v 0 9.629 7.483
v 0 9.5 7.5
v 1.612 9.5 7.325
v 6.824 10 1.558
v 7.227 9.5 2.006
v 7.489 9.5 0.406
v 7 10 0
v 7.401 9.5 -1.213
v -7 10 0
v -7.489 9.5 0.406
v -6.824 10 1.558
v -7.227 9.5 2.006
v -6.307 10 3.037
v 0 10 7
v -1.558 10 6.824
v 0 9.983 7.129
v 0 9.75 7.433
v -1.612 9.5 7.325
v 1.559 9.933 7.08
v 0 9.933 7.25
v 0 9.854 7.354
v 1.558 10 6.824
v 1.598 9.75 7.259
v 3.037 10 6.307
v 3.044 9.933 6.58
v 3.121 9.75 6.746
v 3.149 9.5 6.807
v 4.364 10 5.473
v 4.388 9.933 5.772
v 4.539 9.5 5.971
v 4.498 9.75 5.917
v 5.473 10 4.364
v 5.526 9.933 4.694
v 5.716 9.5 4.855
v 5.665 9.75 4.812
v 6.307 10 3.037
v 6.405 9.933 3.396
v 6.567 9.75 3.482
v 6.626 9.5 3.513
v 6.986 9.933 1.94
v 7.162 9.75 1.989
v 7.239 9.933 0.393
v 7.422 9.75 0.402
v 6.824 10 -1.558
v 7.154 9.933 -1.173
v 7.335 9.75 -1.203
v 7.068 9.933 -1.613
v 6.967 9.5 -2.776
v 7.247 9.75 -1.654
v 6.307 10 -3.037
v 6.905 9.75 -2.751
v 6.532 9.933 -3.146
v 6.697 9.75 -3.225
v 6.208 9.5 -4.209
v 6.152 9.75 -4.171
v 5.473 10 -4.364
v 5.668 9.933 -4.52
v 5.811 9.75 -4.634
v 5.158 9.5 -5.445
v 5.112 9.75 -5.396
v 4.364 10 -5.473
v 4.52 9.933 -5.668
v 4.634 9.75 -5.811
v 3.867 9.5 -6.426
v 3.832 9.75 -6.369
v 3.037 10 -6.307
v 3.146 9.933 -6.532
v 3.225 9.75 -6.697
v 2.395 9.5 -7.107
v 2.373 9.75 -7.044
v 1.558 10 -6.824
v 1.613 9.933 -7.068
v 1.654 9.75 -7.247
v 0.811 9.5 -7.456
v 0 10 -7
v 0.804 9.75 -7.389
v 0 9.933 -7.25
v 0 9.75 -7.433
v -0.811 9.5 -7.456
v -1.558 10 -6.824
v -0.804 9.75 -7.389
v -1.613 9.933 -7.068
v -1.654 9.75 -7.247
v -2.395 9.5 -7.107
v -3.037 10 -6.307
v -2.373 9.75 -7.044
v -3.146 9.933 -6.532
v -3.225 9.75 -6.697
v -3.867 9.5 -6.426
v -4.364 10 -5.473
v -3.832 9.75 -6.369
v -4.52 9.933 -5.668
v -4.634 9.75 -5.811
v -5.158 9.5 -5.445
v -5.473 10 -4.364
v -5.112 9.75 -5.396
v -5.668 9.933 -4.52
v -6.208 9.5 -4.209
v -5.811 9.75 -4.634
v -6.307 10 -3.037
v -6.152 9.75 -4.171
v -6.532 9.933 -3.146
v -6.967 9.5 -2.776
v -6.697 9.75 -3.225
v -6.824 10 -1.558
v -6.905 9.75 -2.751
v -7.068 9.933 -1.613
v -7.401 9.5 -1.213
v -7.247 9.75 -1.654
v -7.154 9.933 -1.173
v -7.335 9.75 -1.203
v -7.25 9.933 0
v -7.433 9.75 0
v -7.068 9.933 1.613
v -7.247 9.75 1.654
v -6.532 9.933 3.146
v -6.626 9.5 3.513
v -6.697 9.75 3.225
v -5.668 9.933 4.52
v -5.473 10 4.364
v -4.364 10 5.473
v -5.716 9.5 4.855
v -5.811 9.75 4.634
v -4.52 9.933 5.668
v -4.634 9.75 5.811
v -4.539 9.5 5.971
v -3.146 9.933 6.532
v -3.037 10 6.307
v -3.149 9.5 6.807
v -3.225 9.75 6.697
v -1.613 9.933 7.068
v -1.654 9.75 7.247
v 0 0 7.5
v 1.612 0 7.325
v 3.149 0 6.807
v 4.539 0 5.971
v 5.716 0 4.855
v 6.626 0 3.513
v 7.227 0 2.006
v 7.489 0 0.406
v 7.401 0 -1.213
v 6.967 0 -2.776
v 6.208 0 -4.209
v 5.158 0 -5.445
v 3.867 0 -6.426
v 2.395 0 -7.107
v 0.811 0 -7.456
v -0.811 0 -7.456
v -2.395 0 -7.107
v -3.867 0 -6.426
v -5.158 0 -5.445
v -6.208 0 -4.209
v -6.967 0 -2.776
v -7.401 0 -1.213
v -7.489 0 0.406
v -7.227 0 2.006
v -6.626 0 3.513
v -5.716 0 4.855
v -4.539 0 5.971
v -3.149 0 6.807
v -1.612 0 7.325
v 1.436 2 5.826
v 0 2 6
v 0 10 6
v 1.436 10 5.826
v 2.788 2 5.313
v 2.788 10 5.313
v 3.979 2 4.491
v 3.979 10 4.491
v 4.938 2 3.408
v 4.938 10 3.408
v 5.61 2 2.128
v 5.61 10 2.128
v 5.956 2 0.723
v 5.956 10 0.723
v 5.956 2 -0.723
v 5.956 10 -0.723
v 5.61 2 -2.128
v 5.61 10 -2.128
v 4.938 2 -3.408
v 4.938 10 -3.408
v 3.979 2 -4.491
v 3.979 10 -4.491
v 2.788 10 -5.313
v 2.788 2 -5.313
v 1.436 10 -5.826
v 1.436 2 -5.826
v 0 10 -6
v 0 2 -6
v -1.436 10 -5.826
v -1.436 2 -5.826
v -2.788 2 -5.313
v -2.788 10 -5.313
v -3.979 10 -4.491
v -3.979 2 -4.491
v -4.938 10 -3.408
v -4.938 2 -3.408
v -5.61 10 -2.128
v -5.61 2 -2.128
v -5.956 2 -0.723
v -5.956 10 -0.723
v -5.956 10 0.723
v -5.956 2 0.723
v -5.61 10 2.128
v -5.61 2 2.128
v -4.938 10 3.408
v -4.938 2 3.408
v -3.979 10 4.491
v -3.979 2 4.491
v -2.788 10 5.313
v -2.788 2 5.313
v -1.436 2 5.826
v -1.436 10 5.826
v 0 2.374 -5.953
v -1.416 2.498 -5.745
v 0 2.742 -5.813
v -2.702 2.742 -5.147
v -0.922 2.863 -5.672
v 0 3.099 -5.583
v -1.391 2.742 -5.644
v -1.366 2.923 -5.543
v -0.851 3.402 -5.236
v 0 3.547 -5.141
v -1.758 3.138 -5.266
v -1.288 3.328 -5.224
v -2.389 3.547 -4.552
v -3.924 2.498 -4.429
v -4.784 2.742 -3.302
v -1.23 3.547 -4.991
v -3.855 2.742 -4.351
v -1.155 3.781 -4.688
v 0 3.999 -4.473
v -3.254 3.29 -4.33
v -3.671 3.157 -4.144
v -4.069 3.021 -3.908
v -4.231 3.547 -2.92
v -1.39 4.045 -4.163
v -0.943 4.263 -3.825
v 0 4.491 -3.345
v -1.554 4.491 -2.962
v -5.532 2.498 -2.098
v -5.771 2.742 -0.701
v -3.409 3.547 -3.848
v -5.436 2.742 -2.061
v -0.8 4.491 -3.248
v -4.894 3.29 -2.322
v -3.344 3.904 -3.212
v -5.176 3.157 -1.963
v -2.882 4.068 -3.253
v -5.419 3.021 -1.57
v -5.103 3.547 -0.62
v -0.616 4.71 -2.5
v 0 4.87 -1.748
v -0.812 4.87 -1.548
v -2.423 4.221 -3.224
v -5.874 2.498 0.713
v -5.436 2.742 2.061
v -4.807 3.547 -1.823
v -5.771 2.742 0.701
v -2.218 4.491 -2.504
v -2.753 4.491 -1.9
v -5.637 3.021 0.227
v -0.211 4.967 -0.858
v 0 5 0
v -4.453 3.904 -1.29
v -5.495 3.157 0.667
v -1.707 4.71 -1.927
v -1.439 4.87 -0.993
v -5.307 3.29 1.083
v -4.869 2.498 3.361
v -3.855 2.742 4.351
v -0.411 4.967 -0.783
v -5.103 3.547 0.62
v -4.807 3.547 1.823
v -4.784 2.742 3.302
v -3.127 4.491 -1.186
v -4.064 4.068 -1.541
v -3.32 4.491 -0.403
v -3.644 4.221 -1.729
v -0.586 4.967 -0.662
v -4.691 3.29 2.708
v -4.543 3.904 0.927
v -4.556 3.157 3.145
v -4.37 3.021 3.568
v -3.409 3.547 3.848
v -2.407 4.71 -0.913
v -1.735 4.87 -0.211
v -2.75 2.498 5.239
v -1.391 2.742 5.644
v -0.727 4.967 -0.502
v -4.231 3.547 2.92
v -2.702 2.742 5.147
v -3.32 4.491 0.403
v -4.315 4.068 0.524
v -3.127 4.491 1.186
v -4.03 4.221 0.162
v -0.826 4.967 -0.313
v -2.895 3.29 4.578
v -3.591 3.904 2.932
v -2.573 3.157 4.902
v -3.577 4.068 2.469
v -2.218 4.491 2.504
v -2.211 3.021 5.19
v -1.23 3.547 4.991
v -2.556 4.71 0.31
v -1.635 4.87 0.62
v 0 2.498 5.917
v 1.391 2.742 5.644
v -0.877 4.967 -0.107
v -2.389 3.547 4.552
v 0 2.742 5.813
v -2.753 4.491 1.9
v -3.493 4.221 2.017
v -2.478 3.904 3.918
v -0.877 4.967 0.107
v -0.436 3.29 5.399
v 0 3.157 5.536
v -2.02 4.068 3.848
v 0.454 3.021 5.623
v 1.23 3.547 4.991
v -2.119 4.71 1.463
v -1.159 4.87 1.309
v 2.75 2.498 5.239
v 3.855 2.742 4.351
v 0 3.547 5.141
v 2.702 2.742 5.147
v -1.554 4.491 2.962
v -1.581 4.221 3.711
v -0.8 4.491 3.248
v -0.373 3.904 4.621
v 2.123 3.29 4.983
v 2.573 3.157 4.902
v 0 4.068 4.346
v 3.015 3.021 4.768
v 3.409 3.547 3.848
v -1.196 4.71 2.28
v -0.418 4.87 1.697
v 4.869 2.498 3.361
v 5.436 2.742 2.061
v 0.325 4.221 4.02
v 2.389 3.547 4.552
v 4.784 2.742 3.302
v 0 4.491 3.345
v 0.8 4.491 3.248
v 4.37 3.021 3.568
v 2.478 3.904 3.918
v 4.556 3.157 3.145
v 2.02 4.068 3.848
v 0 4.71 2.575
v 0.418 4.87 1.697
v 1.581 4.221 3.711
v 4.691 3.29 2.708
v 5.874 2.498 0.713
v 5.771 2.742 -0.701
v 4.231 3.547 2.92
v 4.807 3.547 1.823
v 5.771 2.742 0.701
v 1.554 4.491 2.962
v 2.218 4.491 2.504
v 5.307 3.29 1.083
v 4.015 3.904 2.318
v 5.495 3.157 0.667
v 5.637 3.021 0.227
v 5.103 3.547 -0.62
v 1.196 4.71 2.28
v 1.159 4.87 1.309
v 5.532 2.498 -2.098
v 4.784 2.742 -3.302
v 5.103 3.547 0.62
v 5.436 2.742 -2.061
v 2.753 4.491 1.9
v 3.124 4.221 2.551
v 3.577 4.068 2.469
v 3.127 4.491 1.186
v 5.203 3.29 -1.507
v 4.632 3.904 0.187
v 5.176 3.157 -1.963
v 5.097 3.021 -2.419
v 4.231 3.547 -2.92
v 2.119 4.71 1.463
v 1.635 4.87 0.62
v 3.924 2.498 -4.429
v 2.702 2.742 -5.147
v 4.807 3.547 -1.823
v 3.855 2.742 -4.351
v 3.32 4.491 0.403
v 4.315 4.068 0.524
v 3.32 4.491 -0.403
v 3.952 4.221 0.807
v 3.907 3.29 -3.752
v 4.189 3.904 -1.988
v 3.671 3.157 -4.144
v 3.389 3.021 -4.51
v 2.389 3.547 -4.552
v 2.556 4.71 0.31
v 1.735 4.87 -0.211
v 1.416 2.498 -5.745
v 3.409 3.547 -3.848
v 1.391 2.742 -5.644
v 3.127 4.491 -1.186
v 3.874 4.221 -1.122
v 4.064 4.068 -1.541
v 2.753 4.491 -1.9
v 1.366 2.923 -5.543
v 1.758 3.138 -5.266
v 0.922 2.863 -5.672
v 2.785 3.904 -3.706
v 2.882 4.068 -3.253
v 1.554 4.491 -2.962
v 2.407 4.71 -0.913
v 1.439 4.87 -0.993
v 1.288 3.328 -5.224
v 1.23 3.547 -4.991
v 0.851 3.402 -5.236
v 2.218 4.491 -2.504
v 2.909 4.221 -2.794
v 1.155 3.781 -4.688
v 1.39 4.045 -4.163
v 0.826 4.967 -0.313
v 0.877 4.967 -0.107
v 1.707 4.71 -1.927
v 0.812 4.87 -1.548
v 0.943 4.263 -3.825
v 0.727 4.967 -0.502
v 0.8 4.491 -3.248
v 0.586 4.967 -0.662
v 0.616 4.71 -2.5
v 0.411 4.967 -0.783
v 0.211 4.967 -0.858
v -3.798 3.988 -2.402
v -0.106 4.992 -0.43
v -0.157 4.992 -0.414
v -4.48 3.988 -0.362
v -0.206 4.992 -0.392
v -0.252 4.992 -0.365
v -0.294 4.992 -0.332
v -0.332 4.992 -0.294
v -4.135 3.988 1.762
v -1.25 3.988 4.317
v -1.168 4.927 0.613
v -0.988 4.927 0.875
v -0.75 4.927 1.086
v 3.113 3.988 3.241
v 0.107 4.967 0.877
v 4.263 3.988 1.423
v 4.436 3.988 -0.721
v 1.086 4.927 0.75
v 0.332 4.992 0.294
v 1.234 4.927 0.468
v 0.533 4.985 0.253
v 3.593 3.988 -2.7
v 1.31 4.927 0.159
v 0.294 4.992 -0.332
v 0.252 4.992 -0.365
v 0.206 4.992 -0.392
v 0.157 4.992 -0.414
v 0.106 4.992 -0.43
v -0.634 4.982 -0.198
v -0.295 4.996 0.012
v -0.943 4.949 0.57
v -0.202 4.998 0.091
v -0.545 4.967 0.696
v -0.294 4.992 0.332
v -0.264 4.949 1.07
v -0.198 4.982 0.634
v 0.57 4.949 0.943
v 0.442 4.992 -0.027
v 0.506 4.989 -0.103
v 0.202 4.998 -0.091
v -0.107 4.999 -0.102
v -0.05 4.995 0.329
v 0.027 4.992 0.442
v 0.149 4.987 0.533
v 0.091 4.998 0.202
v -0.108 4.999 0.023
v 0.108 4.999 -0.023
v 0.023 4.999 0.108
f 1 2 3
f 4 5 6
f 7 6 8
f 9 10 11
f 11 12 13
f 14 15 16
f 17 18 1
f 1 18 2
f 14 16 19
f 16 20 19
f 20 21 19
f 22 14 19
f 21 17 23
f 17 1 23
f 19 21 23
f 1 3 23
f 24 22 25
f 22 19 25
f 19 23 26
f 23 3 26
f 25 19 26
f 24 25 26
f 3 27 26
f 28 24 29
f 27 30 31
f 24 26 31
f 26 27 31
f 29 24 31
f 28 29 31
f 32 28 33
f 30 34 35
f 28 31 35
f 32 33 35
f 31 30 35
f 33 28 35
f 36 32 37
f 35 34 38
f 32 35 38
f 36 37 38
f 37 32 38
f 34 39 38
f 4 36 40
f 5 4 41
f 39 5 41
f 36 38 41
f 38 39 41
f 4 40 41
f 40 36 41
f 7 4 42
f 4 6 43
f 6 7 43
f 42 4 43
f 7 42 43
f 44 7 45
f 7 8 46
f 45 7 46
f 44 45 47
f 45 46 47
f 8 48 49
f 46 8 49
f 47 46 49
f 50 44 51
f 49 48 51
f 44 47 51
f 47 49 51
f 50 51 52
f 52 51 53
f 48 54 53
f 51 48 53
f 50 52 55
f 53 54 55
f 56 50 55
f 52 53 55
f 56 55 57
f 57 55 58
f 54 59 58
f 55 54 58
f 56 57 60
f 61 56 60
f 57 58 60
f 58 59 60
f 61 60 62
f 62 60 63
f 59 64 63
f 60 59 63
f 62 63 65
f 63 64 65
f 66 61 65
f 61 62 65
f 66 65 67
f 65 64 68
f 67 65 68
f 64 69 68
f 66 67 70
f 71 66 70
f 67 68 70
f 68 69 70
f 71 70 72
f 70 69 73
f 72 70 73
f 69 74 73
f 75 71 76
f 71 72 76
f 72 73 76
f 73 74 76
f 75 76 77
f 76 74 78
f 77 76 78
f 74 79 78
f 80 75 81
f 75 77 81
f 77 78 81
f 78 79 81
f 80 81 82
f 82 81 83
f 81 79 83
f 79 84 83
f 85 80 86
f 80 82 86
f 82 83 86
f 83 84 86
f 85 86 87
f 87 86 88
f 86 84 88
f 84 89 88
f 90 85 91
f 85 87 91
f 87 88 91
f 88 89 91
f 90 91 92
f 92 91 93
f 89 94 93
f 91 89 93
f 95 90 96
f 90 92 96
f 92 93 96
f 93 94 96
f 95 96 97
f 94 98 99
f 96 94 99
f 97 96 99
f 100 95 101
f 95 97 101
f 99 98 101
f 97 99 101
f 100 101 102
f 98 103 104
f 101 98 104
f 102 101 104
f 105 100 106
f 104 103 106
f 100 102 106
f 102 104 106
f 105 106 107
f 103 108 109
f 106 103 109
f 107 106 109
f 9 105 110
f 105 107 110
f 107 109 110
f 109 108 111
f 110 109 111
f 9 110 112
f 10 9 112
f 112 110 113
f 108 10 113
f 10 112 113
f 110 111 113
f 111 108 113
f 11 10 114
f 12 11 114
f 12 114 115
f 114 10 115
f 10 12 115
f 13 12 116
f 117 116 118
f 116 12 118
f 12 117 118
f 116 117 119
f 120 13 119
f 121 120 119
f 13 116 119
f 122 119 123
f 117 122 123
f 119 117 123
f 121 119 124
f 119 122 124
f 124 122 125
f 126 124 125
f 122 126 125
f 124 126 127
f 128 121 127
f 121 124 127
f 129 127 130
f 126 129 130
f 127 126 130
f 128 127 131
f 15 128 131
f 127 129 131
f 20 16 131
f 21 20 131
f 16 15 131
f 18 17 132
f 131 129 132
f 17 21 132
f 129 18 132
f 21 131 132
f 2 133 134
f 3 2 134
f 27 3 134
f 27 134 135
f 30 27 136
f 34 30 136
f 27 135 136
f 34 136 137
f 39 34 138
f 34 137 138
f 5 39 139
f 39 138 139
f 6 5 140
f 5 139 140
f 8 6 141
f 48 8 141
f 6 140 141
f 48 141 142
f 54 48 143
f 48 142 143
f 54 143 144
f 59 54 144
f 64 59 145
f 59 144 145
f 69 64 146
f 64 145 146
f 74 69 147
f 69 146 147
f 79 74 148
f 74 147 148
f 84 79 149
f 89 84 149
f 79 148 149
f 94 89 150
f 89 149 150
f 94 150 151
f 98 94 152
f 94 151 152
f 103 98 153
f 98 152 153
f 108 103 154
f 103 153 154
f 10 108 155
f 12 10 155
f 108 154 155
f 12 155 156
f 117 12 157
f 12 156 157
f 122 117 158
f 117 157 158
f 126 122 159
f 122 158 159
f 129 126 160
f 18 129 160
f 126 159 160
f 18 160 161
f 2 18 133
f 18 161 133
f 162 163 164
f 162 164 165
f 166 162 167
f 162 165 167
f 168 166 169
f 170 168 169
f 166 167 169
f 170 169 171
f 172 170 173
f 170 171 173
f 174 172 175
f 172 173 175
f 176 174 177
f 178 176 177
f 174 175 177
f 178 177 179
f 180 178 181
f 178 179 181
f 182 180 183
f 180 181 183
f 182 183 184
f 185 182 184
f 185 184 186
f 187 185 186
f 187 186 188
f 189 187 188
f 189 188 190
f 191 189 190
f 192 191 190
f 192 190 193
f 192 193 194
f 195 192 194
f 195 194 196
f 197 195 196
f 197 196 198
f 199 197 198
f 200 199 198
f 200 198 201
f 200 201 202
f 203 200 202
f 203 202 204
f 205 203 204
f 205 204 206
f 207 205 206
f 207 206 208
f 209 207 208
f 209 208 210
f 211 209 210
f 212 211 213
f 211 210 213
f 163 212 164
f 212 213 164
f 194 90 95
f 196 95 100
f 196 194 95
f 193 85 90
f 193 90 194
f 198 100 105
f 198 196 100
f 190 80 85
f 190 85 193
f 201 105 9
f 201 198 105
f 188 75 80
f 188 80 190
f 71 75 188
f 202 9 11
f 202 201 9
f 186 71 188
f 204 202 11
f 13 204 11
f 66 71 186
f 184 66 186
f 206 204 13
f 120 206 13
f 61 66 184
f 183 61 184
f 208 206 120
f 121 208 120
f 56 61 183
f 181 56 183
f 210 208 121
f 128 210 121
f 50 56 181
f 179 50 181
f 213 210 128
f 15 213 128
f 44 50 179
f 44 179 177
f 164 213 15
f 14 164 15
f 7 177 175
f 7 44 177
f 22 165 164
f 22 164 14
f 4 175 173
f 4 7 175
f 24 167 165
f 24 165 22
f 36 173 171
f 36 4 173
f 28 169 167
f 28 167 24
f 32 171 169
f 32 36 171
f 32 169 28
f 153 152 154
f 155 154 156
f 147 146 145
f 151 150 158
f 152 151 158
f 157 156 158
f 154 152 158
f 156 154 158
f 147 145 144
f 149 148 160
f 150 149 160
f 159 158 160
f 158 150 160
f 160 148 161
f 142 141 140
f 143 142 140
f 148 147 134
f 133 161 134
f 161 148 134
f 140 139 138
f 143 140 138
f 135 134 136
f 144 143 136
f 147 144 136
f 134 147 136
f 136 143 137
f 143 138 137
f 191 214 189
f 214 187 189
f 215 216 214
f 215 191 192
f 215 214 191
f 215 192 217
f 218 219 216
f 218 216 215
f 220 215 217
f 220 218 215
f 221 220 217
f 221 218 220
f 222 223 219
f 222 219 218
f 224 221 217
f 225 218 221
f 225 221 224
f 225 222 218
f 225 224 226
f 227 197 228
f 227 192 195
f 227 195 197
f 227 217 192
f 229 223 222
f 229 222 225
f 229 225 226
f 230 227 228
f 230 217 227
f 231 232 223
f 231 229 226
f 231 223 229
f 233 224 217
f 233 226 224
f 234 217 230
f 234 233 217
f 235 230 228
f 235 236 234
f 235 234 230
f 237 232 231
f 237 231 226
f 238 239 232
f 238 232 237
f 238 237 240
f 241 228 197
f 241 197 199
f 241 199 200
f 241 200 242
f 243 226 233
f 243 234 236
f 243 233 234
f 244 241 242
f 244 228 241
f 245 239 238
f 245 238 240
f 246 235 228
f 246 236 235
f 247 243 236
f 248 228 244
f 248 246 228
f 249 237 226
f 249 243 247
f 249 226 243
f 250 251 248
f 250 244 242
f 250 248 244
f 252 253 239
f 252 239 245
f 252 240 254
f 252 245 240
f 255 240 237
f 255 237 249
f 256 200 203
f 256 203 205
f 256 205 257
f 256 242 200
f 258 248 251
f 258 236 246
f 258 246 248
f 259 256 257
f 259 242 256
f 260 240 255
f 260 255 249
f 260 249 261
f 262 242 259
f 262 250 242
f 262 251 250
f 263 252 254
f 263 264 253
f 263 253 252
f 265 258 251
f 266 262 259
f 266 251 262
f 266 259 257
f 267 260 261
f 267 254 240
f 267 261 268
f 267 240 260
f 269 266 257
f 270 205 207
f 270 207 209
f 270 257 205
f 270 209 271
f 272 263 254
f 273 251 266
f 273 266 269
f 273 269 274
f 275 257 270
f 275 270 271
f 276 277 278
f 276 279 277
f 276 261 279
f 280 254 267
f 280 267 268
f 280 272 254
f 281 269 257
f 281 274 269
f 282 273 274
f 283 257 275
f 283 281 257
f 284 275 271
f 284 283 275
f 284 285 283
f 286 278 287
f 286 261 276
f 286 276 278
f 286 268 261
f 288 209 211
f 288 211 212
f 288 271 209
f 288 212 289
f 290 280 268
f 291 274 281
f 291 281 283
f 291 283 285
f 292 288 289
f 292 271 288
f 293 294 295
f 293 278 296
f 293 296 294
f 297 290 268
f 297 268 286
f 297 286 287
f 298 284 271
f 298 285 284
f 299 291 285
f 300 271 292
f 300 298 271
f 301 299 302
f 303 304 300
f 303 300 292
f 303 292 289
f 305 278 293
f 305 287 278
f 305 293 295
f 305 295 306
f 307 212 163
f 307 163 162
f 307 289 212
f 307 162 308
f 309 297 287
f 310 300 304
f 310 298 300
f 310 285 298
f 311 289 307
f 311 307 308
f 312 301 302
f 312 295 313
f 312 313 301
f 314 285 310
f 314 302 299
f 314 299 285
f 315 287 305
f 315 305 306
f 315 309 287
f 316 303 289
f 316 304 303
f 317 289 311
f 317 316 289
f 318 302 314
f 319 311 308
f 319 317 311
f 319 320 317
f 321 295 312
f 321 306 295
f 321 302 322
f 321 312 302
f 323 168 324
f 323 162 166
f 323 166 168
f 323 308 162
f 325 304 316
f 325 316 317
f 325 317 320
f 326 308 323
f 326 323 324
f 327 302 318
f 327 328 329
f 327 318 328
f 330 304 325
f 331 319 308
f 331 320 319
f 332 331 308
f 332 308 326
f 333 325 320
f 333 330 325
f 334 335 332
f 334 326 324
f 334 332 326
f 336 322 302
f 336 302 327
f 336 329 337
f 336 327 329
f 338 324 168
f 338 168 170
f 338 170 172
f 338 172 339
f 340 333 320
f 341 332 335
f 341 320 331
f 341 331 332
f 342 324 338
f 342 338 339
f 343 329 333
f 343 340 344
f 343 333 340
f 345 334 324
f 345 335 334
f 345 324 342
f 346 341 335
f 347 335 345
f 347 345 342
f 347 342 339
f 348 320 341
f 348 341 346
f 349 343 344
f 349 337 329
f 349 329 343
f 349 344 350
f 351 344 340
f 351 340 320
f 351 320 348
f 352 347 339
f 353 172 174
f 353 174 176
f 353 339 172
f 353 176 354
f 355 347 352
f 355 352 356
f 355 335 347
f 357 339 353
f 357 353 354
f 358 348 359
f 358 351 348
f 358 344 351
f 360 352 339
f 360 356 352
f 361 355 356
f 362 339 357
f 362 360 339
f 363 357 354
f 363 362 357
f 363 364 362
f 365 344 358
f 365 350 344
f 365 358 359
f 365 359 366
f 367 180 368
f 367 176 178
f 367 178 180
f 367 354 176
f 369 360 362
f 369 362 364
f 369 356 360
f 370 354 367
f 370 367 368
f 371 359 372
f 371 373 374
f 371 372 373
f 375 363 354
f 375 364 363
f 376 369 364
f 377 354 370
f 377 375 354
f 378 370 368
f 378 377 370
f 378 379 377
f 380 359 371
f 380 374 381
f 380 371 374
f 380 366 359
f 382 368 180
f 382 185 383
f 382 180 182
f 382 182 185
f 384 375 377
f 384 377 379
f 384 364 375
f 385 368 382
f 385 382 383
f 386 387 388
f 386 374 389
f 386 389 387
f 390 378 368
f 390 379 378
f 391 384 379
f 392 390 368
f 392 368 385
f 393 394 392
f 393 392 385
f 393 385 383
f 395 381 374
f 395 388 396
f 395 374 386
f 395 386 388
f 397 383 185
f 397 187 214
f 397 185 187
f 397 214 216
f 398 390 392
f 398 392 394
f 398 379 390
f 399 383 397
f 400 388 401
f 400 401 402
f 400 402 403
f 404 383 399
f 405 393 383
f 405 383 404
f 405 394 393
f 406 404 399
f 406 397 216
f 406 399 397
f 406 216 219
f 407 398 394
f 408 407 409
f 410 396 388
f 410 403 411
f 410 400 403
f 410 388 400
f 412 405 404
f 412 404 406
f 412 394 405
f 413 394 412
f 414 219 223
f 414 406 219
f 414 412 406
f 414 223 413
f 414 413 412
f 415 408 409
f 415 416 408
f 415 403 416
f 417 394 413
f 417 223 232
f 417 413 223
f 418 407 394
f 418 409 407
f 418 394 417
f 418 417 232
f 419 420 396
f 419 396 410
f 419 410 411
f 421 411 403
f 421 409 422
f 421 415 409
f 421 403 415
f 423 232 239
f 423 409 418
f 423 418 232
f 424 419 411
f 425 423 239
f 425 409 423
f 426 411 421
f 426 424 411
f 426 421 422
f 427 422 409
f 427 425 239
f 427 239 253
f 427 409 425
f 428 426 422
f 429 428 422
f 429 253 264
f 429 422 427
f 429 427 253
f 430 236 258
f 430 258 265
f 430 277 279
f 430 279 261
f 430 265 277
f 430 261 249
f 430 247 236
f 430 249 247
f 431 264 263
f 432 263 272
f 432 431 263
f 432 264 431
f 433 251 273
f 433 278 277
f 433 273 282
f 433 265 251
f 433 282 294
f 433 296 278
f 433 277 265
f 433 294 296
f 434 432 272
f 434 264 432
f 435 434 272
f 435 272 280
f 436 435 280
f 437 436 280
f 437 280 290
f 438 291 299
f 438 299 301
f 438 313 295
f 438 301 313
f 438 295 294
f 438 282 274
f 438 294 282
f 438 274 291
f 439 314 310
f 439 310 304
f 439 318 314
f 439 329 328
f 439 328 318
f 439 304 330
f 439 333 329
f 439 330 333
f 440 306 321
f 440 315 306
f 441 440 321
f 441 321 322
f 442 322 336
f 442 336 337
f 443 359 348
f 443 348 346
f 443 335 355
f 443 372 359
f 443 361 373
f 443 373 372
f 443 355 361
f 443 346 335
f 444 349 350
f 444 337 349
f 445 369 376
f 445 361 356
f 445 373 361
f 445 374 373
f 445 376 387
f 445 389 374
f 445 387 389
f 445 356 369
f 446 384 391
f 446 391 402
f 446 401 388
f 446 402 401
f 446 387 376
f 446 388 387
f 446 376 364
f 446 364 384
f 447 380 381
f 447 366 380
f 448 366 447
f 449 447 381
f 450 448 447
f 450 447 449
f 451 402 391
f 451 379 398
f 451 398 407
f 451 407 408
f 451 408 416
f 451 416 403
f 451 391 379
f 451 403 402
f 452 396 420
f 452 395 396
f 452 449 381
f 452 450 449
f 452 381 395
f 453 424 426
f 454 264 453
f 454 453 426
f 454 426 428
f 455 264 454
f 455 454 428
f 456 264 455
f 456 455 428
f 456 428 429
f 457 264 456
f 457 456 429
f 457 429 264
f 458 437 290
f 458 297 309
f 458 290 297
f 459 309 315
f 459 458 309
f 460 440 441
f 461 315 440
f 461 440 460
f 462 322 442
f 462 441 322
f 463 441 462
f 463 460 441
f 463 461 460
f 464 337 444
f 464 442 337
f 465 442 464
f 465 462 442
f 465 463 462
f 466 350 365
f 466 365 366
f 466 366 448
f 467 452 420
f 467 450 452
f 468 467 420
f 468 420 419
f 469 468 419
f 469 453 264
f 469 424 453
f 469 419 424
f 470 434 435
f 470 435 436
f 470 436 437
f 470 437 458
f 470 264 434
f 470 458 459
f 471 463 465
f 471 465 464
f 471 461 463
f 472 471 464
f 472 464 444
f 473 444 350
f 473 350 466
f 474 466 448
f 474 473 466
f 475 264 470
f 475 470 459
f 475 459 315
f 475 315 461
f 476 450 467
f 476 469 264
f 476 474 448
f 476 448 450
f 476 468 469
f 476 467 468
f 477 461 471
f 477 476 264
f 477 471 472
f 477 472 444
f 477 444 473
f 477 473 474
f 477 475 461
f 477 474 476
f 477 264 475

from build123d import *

# Parameters (mm, degrees)
SKETCH2_R           = 7.5
BOSS_EXTRUDE1_DEPTH = 10
SKETCH3_R           = 6
CUT_EXTRUDE1_DEPTH  = 8
DOME1_FACE_RADIUS   = 6
DOME1_HEIGHT        = 3
FILLET1_R           = 0.5


with BuildPart() as part:
    # Sketch2 → Boss-Extrude1 (new body)
    with BuildSketch(Plane(origin=(0, 0, 0), x_dir=(1, 0, 0), z_dir=(0, 1, 0))):
        Circle(SKETCH2_R)
    extrude(amount=BOSS_EXTRUDE1_DEPTH)

    # Sketch3 → Cut-Extrude1 (cut)
    with BuildSketch(Plane(origin=(0, 10, 0), x_dir=(1, 0, 0), z_dir=(0, 1, 0))):
        Circle(SKETCH3_R)
    extrude(amount=-CUT_EXTRUDE1_DEPTH, mode=Mode.SUBTRACT)

    # Dome1: an elliptical dome of height H over a round flat face of radius A is half a spheroid: the quarter ellipse of half axes A and H revolved about the face's axis
    with BuildSketch(Plane((0, 2, 0), x_dir=(0, 0, -1), z_dir=(1, 0, 0)), mode=Mode.PRIVATE) as dome1_quarter:
        Ellipse(DOME1_FACE_RADIUS, DOME1_HEIGHT)
        Rectangle(DOME1_FACE_RADIUS, DOME1_HEIGHT, align=(Align.MIN, Align.MIN), mode=Mode.INTERSECT)
    revolve(dome1_quarter.sketch, axis=Axis((0, 2, 0), (0, 1, 0)))

    # Fillet1
    fillet1_edges = [part.edges().sort_by_distance(p)[0] for p in [
        (-7.5, 10, 0),
    ]]
    fillet(fillet1_edges, radius=FILLET1_R)


solid = part.part
